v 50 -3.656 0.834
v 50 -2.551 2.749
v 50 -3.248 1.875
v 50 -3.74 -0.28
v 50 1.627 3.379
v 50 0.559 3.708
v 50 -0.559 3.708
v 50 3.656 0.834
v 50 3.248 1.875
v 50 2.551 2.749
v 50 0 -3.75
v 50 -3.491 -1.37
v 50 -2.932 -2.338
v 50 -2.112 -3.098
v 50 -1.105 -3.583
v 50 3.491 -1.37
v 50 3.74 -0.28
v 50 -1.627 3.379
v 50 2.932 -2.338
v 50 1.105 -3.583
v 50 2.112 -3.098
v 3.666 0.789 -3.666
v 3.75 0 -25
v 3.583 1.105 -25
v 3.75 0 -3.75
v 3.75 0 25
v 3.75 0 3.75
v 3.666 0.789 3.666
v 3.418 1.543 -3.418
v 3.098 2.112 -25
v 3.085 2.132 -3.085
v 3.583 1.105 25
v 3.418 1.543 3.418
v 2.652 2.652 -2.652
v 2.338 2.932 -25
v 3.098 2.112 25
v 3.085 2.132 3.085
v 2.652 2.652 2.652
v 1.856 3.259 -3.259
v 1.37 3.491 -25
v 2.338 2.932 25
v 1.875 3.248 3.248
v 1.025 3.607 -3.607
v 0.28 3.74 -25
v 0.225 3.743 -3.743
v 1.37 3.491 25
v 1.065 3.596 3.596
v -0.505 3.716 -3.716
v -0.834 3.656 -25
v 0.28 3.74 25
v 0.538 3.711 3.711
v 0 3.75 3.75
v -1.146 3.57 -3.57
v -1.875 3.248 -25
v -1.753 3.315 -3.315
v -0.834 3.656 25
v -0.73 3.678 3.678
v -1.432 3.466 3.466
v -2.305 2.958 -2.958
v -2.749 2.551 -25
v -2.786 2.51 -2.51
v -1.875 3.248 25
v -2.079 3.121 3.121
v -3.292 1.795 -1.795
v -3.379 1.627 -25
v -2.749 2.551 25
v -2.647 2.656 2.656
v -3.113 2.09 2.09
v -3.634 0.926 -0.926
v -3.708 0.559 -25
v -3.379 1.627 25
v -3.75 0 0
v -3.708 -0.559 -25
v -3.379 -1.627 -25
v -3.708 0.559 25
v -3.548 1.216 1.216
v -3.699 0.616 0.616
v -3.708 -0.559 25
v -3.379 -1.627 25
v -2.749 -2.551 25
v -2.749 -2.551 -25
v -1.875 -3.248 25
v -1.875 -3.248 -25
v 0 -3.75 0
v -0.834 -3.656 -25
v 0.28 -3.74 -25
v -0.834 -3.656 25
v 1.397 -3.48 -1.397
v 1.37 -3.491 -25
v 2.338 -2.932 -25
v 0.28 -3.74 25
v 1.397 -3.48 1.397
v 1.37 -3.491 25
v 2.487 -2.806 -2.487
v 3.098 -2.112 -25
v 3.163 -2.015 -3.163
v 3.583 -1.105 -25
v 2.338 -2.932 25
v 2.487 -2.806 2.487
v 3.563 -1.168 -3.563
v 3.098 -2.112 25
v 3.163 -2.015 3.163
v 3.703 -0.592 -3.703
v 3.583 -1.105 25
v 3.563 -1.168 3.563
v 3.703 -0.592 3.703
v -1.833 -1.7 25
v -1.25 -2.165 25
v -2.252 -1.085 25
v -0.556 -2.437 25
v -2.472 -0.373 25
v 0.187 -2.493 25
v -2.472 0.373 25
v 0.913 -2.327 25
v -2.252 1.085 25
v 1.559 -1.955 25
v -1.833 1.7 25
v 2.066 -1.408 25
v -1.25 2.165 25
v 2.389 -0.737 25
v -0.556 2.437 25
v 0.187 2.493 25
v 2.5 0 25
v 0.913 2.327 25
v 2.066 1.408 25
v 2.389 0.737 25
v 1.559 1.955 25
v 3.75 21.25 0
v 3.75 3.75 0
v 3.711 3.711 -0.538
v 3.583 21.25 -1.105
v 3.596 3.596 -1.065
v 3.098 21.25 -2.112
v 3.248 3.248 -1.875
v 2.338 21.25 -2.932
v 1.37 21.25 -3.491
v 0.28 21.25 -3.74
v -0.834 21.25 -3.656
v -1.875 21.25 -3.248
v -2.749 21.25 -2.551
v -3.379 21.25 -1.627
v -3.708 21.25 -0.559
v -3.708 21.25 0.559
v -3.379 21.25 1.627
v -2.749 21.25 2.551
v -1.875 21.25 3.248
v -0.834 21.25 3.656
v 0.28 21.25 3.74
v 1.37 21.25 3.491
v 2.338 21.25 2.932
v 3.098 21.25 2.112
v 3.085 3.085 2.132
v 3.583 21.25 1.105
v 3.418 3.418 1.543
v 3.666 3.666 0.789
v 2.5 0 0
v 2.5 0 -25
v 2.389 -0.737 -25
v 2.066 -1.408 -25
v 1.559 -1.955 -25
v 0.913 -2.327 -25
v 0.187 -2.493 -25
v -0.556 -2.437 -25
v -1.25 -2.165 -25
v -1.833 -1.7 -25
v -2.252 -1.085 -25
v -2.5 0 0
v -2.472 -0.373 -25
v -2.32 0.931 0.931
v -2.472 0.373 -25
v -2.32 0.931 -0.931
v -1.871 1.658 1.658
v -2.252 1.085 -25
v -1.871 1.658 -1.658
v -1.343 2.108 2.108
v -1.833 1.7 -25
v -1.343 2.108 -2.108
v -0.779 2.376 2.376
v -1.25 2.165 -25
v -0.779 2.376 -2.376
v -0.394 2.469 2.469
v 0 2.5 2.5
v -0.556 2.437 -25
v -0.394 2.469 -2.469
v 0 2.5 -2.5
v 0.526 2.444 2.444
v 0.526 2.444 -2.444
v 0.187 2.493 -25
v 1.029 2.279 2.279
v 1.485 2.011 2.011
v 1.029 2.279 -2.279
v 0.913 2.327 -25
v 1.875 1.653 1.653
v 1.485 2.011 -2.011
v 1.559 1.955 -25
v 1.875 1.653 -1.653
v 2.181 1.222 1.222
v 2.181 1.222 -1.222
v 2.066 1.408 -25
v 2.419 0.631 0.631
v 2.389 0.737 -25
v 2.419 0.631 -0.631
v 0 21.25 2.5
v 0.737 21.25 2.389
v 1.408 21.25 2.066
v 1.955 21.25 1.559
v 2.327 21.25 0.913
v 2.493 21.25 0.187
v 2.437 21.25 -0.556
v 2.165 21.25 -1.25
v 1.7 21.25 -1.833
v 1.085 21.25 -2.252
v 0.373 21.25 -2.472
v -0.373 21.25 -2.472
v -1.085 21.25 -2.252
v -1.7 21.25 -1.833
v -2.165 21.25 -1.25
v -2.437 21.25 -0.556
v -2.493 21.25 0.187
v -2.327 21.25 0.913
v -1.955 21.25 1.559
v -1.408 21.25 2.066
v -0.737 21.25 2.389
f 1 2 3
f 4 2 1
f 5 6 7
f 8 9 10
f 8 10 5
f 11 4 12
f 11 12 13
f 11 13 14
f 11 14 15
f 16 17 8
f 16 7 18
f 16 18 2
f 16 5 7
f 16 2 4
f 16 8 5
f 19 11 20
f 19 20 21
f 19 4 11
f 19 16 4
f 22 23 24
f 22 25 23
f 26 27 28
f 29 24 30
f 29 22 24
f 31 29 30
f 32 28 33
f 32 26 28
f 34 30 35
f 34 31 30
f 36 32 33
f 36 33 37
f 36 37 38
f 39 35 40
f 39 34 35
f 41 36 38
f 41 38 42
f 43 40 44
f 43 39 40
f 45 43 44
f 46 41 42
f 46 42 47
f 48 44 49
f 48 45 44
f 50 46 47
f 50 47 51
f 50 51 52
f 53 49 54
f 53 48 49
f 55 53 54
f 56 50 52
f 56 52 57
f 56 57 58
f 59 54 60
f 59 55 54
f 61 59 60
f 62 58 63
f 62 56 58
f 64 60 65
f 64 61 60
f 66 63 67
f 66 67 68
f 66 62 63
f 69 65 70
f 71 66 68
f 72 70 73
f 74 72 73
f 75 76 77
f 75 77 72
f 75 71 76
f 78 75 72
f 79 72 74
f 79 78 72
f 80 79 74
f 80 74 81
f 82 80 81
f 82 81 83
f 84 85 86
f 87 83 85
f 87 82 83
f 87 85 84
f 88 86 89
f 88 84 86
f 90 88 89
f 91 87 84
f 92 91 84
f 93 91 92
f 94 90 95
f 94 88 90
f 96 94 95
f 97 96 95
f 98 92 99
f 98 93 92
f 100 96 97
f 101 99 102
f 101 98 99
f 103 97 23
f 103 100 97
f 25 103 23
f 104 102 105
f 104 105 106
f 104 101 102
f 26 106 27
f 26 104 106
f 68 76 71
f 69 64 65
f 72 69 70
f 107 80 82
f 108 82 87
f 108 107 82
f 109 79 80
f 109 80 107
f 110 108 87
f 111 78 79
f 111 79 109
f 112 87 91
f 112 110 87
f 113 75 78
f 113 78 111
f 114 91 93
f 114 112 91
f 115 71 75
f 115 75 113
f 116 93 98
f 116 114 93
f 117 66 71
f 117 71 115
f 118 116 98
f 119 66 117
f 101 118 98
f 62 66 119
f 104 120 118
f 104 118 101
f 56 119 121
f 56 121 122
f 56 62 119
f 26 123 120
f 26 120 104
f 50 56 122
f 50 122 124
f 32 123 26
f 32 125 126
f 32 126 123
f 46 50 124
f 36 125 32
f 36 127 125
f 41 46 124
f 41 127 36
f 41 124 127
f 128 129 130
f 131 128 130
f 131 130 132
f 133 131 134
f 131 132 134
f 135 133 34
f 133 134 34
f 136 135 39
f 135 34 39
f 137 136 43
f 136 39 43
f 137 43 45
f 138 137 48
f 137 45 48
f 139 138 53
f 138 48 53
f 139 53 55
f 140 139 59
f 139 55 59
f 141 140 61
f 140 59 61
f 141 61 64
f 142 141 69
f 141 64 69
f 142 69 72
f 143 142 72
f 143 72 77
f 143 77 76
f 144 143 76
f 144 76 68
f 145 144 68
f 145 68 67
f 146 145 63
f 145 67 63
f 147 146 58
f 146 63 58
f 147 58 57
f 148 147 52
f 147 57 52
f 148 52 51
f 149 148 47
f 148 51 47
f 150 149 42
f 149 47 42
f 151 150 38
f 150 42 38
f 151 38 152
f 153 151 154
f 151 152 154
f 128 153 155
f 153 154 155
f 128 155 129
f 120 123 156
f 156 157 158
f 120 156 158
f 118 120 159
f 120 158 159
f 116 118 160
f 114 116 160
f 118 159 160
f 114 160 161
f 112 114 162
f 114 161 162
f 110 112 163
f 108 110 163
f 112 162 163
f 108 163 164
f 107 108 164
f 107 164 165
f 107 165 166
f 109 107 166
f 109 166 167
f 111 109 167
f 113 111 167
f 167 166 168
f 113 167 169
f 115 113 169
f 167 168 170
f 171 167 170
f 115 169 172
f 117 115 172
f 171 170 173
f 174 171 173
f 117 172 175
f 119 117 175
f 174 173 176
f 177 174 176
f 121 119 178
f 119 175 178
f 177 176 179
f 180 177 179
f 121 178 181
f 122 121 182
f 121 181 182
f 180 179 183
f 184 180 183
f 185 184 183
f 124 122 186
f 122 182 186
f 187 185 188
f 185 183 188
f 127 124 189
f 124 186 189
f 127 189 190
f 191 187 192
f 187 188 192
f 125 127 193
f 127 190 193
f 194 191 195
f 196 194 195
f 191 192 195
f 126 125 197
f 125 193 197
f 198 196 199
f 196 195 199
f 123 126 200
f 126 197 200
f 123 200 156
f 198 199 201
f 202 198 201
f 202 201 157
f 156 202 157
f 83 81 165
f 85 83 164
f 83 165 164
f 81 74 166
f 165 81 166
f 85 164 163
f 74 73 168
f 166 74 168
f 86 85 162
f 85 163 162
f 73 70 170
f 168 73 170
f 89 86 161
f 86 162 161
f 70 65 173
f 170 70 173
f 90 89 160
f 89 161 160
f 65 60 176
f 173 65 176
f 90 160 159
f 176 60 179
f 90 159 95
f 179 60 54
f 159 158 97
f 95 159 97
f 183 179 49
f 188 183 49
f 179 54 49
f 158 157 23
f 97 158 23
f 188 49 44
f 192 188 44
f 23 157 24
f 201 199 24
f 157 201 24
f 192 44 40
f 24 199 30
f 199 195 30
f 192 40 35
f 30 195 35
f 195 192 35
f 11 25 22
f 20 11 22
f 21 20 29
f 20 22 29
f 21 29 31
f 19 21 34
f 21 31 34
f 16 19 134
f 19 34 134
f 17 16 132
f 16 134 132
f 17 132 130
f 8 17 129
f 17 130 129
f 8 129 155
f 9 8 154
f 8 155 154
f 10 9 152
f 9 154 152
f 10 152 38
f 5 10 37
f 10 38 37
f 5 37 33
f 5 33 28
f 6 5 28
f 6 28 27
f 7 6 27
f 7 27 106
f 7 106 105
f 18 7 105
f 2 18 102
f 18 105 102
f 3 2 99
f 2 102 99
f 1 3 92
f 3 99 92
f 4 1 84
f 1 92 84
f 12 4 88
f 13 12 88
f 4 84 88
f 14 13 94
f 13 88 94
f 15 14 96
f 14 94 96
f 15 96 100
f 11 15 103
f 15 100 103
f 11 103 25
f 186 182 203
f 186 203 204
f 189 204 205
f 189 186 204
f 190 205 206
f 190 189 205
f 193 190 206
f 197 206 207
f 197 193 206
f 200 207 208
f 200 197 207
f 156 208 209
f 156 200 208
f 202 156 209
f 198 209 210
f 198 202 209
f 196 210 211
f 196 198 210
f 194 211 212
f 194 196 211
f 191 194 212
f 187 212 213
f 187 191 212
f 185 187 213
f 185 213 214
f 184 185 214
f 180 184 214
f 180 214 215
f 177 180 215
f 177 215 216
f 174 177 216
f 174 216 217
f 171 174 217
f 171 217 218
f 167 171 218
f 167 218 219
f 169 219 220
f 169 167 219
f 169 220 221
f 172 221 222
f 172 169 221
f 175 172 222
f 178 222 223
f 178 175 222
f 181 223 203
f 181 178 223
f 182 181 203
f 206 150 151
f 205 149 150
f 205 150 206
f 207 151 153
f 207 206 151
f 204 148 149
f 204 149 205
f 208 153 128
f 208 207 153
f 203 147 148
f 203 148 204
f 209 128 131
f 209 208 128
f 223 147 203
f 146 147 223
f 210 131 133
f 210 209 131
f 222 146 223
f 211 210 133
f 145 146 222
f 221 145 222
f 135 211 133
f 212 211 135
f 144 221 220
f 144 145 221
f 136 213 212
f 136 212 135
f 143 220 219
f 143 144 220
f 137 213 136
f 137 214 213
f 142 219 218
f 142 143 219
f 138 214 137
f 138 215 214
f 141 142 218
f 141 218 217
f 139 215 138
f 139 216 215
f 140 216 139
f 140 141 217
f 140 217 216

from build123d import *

# Parameters (mm, degrees)
SKETCH1_R                = 3.75
BOSS_EXTRUDE1_DEPTH      = 25
BOSS_EXTRUDE10_START     = -1e-07
BOSS_EXTRUDE10_OUTLINE_R = 3.75
BOSS_EXTRUDE10_DEPTH     = 53.7500002
BOSS_EXTRUDE10_START_2   = -5
BOSS_EXTRUDE10_2_DEPTH   = 10
CUT_REVOLVE2_START       = -5
CUT_REVOLVE2_OUTLINE_W   = 10
CUT_REVOLVE2_OUTLINE_H   = 33.75
CUT_REVOLVE2_DEPTH       = 10
SKETCH10_R               = 3.75
BOSS_EXTRUDE18_DEPTH     = 50
SKETCH11_R               = 2.5
CUT_EXTRUDE12_DEPTH      = 50
CUT_EXTRUDE14_START      = -21.25
SKETCH13_R               = 2.5
CUT_EXTRUDE14_DEPTH      = 21.25


with BuildPart() as part:
    # Sketch1 → Boss-Extrude1 (new, symmetric)
    with BuildSketch(Plane.XY):
        Circle(SKETCH1_R)
    extrude(amount=BOSS_EXTRUDE1_DEPTH, both=True)

    # Boss-Extrude10: read off the stored shape, not the designer's step
    # Boss-Extrude10 outline → Boss-Extrude10 (add)
    with BuildSketch(Plane(origin=(0, 0, 0), x_dir=(1, 0, 0), z_dir=(0, 1, 0)).offset(BOSS_EXTRUDE10_START)):
        Circle(BOSS_EXTRUDE10_OUTLINE_R)
    extrude(amount=BOSS_EXTRUDE10_DEPTH)

    # Boss-Extrude10 2 outline → Boss-Extrude10 2 (cut)
    with BuildSketch(Plane.XY.offset(BOSS_EXTRUDE10_START_2)):
        with BuildLine():
            Line((-5, 50), (-3.75, 50))
            ThreePointArc((-3.75, 50), (-2.651650429, 52.651650429), (0, 53.75))
            Line((0, 53.75), (-5, 53.7500001))
            Line((-5, 53.7500001), (-5, 50))
        make_face()
        with BuildLine():
            Line((5, 53.7500001), (0, 53.75))
            ThreePointArc((0, 53.75), (2.651650429, 52.651650429), (3.75, 50))
            Line((3.75, 50), (5, 50))
            Line((5, 50), (5, 53.7500001))
        make_face()
    extrude(amount=BOSS_EXTRUDE10_2_DEPTH, mode=Mode.SUBTRACT)

    # Cut-Revolve2: read off the stored shape, not the designer's step
    # Cut-Revolve2 outline → Cut-Revolve2 (cut)
    with BuildSketch(Plane(origin=(0, 0, 0), x_dir=(0, 0, -1), z_dir=(1, 0, 0)).offset(CUT_REVOLVE2_START)):
        with Locations((0, 38.125)):
            Rectangle(CUT_REVOLVE2_OUTLINE_W, CUT_REVOLVE2_OUTLINE_H)
    extrude(amount=CUT_REVOLVE2_DEPTH, mode=Mode.SUBTRACT)

    # Sketch10 → Boss-Extrude18 (add)
    with BuildSketch(Plane(origin=(0, 0, 0), x_dir=(0, 0, -1), z_dir=(1, 0, 0))):
        Circle(SKETCH10_R)
    extrude(amount=BOSS_EXTRUDE18_DEPTH)

    # Sketch11 → Cut-Extrude12 (cut)
    with BuildSketch(Plane(origin=(0, 0, -25), x_dir=(-1, 0, 0), z_dir=(0, 0, -1))):
        with Locations(Location((0, 0, 0), (0, 0, 180))):
            Circle(SKETCH11_R)
    extrude(amount=-CUT_EXTRUDE12_DEPTH, mode=Mode.SUBTRACT)

    # Sketch13 → Cut-Extrude14 (cut)
    with BuildSketch(Plane(origin=(0, 21.25, 0), x_dir=(1, 0, 0), z_dir=(0, 1, 0)).offset(CUT_EXTRUDE14_START)):
        with Locations(Location((0, 0, 0), (0, 0, 270))):
            Circle(SKETCH13_R)
    extrude(amount=CUT_EXTRUDE14_DEPTH, mode=Mode.SUBTRACT)


solid = part.part
